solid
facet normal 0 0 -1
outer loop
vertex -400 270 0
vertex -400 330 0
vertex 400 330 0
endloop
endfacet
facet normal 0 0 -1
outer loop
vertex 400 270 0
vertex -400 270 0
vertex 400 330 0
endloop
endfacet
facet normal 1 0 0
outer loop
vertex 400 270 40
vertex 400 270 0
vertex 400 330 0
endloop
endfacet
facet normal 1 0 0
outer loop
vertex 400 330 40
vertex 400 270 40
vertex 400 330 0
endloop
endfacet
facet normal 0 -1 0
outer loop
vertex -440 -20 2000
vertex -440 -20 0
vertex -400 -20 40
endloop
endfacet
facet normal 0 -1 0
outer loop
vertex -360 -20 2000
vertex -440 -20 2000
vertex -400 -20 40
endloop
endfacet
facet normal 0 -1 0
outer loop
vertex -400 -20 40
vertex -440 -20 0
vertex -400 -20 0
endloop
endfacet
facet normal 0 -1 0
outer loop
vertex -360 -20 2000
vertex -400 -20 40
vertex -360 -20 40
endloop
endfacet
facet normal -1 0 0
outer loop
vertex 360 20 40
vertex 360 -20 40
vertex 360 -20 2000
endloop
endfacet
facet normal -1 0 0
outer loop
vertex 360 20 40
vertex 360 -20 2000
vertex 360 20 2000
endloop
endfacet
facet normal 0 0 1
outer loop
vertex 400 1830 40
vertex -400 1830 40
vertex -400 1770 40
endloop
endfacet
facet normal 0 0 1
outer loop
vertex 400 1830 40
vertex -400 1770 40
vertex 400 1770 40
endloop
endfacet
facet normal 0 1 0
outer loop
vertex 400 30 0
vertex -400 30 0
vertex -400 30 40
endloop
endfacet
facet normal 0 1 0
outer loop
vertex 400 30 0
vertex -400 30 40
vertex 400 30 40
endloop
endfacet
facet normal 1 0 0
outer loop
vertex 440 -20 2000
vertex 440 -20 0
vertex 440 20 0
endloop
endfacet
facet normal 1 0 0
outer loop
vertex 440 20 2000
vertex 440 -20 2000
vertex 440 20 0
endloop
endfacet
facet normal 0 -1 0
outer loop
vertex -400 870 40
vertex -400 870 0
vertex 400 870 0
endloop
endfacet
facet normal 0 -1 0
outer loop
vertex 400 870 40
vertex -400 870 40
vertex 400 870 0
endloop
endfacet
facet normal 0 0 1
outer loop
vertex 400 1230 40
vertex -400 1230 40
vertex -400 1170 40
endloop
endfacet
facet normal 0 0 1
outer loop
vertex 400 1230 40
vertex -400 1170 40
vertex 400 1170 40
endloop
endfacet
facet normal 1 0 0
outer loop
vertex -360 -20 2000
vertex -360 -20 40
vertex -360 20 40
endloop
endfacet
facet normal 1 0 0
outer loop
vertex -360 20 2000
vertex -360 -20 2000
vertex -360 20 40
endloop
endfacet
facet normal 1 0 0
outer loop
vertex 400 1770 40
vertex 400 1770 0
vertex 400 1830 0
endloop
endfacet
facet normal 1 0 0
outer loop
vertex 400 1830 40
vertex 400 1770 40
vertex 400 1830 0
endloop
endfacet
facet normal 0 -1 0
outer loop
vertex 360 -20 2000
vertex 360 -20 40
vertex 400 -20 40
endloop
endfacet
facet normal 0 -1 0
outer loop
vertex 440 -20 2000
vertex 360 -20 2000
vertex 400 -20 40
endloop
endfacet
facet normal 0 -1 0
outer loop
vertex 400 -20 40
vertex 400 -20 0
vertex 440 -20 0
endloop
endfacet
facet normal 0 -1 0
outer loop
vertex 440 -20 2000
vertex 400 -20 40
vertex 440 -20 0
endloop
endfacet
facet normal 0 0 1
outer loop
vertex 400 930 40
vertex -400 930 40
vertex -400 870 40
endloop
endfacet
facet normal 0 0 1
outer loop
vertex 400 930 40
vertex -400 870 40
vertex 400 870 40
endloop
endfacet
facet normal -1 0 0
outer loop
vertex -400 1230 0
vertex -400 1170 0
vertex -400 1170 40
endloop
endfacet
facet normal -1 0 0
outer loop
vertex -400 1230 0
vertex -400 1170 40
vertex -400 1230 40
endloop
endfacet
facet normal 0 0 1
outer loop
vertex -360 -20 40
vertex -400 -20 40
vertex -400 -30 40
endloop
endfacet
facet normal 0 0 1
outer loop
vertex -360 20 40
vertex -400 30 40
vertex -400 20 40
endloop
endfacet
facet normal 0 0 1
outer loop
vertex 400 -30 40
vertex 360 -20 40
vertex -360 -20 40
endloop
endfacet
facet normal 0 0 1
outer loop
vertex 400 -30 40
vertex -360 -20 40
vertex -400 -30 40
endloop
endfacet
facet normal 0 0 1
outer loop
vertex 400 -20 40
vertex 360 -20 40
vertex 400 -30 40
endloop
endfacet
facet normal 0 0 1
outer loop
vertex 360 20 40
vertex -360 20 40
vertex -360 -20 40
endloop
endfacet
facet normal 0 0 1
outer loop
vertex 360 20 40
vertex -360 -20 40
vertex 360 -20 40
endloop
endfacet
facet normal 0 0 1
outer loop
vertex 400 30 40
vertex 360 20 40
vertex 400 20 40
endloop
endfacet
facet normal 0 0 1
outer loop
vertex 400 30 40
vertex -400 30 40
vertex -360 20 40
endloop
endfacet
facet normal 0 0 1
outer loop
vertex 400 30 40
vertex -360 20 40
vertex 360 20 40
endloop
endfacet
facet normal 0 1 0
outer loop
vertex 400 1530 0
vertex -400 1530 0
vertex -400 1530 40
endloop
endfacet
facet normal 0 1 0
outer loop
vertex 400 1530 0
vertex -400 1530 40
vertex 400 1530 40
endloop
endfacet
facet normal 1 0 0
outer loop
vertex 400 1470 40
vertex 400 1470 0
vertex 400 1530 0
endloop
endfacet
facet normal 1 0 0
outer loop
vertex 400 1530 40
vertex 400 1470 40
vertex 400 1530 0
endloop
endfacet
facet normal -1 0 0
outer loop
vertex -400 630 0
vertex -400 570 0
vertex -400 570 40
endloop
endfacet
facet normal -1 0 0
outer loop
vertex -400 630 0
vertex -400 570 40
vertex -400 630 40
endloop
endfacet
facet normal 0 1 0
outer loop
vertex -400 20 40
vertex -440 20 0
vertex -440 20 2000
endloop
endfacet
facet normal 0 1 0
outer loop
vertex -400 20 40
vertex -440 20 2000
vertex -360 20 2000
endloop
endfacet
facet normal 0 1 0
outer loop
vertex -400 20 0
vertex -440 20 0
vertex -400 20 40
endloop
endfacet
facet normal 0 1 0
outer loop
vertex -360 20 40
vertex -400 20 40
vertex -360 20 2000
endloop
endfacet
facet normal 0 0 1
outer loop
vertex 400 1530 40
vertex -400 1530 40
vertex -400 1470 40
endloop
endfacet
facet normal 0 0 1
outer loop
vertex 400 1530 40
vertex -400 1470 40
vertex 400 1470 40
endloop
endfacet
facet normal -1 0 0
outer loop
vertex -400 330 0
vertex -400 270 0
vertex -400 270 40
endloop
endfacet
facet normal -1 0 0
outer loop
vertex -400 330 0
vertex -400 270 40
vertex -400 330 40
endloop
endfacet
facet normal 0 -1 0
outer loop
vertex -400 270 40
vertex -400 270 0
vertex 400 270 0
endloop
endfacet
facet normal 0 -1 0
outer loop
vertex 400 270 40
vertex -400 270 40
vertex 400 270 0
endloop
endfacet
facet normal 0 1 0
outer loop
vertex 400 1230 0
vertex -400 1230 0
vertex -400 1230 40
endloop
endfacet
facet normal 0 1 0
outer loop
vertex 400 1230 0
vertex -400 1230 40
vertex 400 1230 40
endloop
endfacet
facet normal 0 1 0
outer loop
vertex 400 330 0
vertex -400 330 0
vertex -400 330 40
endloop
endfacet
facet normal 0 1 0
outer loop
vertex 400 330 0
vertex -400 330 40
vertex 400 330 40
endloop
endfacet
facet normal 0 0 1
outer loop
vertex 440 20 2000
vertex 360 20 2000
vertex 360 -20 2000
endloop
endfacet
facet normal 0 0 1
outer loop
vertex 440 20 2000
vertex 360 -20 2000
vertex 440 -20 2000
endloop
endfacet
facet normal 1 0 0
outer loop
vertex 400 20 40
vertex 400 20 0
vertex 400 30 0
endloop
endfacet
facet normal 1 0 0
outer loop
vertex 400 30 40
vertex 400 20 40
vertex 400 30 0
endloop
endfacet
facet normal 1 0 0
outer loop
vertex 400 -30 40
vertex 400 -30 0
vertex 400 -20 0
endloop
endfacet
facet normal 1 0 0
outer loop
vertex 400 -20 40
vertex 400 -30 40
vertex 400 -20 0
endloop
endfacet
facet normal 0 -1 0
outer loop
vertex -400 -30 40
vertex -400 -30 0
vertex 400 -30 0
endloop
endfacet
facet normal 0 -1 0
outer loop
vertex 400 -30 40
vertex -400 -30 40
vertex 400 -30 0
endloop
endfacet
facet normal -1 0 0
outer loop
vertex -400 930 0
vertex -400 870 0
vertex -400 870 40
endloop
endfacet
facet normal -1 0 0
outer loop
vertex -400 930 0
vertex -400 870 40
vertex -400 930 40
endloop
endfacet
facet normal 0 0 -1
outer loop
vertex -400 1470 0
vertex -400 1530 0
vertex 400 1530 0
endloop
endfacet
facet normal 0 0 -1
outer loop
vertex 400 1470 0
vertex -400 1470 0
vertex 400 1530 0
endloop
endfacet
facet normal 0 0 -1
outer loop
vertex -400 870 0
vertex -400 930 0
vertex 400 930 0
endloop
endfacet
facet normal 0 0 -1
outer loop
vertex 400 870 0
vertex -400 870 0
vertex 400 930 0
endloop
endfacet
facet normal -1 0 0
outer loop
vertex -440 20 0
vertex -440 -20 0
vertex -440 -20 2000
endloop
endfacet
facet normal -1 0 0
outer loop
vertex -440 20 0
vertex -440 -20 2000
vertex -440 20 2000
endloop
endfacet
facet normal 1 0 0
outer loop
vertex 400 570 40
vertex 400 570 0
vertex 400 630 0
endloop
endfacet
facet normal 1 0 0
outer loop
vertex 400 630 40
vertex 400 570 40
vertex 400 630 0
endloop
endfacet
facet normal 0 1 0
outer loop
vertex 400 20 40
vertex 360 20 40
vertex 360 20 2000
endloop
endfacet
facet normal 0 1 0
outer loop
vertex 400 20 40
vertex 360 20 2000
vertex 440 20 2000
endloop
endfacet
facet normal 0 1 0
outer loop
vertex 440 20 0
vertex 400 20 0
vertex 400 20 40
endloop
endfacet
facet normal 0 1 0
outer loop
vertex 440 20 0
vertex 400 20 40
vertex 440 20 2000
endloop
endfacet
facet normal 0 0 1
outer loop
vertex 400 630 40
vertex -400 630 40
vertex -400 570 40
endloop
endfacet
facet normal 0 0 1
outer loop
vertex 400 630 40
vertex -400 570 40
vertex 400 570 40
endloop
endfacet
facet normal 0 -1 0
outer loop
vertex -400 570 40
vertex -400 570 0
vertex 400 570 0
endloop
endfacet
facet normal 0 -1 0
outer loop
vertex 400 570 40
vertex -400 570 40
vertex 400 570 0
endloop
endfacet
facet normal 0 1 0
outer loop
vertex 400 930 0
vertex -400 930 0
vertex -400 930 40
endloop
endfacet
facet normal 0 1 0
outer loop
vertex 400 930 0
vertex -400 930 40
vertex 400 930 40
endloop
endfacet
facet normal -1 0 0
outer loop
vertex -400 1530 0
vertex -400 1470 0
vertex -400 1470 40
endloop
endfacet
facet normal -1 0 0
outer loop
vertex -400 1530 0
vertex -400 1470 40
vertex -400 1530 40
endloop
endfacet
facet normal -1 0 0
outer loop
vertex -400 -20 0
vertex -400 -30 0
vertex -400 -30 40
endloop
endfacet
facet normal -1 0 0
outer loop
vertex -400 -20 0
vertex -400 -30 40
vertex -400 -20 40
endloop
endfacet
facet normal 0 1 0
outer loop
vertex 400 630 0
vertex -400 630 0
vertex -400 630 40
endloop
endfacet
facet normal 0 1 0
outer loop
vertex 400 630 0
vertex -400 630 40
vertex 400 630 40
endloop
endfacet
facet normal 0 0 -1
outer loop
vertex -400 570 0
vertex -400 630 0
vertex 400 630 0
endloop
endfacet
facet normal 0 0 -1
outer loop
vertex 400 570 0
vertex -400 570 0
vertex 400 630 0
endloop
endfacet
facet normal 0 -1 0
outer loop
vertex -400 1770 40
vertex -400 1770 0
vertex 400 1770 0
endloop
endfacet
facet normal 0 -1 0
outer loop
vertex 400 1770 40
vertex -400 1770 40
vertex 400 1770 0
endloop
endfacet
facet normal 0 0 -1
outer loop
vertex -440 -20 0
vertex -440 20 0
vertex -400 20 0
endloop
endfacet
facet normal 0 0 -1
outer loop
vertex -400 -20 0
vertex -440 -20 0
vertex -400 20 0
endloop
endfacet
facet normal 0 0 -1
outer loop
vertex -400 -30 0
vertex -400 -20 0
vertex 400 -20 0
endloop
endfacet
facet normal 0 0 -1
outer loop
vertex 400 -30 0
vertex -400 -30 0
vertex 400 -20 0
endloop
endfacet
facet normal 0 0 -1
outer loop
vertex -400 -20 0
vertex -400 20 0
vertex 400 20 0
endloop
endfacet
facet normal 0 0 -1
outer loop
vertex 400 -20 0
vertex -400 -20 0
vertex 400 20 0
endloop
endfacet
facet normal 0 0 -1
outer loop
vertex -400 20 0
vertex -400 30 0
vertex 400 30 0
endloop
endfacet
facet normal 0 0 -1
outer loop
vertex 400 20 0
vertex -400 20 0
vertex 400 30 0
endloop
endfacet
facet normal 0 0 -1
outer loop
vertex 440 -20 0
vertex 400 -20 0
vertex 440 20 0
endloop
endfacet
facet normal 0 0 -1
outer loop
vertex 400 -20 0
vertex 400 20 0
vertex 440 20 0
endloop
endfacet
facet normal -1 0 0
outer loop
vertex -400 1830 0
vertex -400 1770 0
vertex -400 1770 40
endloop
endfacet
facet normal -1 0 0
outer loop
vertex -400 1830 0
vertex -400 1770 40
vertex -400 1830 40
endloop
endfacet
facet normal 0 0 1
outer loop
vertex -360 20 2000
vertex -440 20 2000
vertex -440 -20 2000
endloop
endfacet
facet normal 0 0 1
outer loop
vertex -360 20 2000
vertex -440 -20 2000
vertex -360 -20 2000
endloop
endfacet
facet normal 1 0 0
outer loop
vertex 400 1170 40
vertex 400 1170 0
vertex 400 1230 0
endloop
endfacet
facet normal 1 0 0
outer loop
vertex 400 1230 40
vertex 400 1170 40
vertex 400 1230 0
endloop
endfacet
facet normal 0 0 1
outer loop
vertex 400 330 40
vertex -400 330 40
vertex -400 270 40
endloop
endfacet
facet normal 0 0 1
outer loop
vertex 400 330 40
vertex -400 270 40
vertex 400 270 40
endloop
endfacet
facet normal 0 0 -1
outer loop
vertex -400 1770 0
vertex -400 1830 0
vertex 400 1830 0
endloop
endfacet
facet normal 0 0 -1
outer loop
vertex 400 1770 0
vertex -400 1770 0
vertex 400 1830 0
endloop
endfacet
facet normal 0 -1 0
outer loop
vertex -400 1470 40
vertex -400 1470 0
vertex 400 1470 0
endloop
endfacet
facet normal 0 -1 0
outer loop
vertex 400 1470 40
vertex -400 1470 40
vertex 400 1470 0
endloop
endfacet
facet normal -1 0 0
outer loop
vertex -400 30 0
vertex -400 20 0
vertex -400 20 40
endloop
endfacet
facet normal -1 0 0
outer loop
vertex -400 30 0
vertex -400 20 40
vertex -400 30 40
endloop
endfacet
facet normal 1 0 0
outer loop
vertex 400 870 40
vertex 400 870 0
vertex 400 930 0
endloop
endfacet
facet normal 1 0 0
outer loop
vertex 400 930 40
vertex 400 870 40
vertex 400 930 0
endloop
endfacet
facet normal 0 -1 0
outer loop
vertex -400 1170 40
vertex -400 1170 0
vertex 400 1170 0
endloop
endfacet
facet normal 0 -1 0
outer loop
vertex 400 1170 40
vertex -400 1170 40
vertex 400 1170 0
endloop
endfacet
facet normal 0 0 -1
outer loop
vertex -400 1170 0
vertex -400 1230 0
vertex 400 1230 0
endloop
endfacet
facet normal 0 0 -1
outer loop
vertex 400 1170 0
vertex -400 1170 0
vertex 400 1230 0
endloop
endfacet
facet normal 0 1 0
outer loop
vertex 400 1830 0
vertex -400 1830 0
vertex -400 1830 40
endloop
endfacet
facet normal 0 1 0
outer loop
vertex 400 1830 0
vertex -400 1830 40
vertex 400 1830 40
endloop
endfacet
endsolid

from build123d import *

# Parameters (mm, degrees)
SKETCH_1_W      = 80
SKETCH_1_H      = 40
EXTRUDE_1_DEPTH = 2000
SKETCH_2_W      = 80
SKETCH_2_H      = 40
EXTRUDE_2_DEPTH = 2000
SKETCH_3_W      = 800
SKETCH_3_H      = 60
EXTRUDE_3_DEPTH = 40
SKETCH_4_W      = 800
SKETCH_4_H      = 60
EXTRUDE_4_DEPTH = 40
SKETCH_5_W      = 800
SKETCH_5_H      = 60
EXTRUDE_5_DEPTH = 40
SKETCH_6_W      = 800
SKETCH_6_H      = 60
EXTRUDE_6_DEPTH = 40
SKETCH_7_W      = 800
SKETCH_7_H      = 60
EXTRUDE_7_DEPTH = 40
SKETCH_8_W      = 800
SKETCH_8_H      = 60
EXTRUDE_8_DEPTH = 40
SKETCH_9_W      = 800
SKETCH_9_H      = 60
EXTRUDE_9_DEPTH = 40


with BuildPart() as part:
    # 草图1 → 凸台-拉伸1 (new body)
    with BuildSketch(Plane.XY):
        with Locations((-400, 0)):
            Rectangle(SKETCH_1_W, SKETCH_1_H)
    extrude(amount=EXTRUDE_1_DEPTH)



with BuildPart() as body_2:
    # 草图2 → 凸台-拉伸2 (new body)
    with BuildSketch(Plane.XY):
        with Locations((400, 0)):
            Rectangle(SKETCH_2_W, SKETCH_2_H)
    extrude(amount=EXTRUDE_2_DEPTH)


with BuildPart() as part_1:
    add(part.part)

    add(body_2.part)  # 凸台-拉伸3 merges body 2
    # 草图3 → 凸台-拉伸3 (add)
    with BuildSketch(Plane.XY):
        Rectangle(SKETCH_3_W, SKETCH_3_H)
    extrude(amount=EXTRUDE_3_DEPTH)


with BuildPart() as body_2_2:
    # 草图4 → 凸台-拉伸4 (new body)
    with BuildSketch(Plane.XY):
        with Locations((0, 300)):
            Rectangle(SKETCH_4_W, SKETCH_4_H)
    extrude(amount=EXTRUDE_4_DEPTH)


with BuildPart() as body_3:
    # 草图5 → 凸台-拉伸5 (new body)
    with BuildSketch(Plane.XY):
        with Locations((0, 600)):
            Rectangle(SKETCH_5_W, SKETCH_5_H)
    extrude(amount=EXTRUDE_5_DEPTH)


with BuildPart() as body_4:
    # 草图6 → 凸台-拉伸6 (new body)
    with BuildSketch(Plane.XY):
        with Locations((0, 900)):
            Rectangle(SKETCH_6_W, SKETCH_6_H)
    extrude(amount=EXTRUDE_6_DEPTH)


with BuildPart() as body_5:
    # 草图7 → 凸台-拉伸7 (new body)
    with BuildSketch(Plane.XY):
        with Locations((0, 1200)):
            Rectangle(SKETCH_7_W, SKETCH_7_H)
    extrude(amount=EXTRUDE_7_DEPTH)


with BuildPart() as body_6:
    # 草图8 → 凸台-拉伸8 (new body)
    with BuildSketch(Plane.XY):
        with Locations((0, 1500)):
            Rectangle(SKETCH_8_W, SKETCH_8_H)
    extrude(amount=EXTRUDE_8_DEPTH)


with BuildPart() as body_7:
    # 草图9 → 凸台-拉伸9 (new body)
    with BuildSketch(Plane.XY):
        with Locations((0, 1800)):
            Rectangle(SKETCH_9_W, SKETCH_9_H)
    extrude(amount=EXTRUDE_9_DEPTH)


solid = Compound([part_1.part, body_2_2.part, body_3.part, body_4.part, body_5.part, body_6.part, body_7.part])
